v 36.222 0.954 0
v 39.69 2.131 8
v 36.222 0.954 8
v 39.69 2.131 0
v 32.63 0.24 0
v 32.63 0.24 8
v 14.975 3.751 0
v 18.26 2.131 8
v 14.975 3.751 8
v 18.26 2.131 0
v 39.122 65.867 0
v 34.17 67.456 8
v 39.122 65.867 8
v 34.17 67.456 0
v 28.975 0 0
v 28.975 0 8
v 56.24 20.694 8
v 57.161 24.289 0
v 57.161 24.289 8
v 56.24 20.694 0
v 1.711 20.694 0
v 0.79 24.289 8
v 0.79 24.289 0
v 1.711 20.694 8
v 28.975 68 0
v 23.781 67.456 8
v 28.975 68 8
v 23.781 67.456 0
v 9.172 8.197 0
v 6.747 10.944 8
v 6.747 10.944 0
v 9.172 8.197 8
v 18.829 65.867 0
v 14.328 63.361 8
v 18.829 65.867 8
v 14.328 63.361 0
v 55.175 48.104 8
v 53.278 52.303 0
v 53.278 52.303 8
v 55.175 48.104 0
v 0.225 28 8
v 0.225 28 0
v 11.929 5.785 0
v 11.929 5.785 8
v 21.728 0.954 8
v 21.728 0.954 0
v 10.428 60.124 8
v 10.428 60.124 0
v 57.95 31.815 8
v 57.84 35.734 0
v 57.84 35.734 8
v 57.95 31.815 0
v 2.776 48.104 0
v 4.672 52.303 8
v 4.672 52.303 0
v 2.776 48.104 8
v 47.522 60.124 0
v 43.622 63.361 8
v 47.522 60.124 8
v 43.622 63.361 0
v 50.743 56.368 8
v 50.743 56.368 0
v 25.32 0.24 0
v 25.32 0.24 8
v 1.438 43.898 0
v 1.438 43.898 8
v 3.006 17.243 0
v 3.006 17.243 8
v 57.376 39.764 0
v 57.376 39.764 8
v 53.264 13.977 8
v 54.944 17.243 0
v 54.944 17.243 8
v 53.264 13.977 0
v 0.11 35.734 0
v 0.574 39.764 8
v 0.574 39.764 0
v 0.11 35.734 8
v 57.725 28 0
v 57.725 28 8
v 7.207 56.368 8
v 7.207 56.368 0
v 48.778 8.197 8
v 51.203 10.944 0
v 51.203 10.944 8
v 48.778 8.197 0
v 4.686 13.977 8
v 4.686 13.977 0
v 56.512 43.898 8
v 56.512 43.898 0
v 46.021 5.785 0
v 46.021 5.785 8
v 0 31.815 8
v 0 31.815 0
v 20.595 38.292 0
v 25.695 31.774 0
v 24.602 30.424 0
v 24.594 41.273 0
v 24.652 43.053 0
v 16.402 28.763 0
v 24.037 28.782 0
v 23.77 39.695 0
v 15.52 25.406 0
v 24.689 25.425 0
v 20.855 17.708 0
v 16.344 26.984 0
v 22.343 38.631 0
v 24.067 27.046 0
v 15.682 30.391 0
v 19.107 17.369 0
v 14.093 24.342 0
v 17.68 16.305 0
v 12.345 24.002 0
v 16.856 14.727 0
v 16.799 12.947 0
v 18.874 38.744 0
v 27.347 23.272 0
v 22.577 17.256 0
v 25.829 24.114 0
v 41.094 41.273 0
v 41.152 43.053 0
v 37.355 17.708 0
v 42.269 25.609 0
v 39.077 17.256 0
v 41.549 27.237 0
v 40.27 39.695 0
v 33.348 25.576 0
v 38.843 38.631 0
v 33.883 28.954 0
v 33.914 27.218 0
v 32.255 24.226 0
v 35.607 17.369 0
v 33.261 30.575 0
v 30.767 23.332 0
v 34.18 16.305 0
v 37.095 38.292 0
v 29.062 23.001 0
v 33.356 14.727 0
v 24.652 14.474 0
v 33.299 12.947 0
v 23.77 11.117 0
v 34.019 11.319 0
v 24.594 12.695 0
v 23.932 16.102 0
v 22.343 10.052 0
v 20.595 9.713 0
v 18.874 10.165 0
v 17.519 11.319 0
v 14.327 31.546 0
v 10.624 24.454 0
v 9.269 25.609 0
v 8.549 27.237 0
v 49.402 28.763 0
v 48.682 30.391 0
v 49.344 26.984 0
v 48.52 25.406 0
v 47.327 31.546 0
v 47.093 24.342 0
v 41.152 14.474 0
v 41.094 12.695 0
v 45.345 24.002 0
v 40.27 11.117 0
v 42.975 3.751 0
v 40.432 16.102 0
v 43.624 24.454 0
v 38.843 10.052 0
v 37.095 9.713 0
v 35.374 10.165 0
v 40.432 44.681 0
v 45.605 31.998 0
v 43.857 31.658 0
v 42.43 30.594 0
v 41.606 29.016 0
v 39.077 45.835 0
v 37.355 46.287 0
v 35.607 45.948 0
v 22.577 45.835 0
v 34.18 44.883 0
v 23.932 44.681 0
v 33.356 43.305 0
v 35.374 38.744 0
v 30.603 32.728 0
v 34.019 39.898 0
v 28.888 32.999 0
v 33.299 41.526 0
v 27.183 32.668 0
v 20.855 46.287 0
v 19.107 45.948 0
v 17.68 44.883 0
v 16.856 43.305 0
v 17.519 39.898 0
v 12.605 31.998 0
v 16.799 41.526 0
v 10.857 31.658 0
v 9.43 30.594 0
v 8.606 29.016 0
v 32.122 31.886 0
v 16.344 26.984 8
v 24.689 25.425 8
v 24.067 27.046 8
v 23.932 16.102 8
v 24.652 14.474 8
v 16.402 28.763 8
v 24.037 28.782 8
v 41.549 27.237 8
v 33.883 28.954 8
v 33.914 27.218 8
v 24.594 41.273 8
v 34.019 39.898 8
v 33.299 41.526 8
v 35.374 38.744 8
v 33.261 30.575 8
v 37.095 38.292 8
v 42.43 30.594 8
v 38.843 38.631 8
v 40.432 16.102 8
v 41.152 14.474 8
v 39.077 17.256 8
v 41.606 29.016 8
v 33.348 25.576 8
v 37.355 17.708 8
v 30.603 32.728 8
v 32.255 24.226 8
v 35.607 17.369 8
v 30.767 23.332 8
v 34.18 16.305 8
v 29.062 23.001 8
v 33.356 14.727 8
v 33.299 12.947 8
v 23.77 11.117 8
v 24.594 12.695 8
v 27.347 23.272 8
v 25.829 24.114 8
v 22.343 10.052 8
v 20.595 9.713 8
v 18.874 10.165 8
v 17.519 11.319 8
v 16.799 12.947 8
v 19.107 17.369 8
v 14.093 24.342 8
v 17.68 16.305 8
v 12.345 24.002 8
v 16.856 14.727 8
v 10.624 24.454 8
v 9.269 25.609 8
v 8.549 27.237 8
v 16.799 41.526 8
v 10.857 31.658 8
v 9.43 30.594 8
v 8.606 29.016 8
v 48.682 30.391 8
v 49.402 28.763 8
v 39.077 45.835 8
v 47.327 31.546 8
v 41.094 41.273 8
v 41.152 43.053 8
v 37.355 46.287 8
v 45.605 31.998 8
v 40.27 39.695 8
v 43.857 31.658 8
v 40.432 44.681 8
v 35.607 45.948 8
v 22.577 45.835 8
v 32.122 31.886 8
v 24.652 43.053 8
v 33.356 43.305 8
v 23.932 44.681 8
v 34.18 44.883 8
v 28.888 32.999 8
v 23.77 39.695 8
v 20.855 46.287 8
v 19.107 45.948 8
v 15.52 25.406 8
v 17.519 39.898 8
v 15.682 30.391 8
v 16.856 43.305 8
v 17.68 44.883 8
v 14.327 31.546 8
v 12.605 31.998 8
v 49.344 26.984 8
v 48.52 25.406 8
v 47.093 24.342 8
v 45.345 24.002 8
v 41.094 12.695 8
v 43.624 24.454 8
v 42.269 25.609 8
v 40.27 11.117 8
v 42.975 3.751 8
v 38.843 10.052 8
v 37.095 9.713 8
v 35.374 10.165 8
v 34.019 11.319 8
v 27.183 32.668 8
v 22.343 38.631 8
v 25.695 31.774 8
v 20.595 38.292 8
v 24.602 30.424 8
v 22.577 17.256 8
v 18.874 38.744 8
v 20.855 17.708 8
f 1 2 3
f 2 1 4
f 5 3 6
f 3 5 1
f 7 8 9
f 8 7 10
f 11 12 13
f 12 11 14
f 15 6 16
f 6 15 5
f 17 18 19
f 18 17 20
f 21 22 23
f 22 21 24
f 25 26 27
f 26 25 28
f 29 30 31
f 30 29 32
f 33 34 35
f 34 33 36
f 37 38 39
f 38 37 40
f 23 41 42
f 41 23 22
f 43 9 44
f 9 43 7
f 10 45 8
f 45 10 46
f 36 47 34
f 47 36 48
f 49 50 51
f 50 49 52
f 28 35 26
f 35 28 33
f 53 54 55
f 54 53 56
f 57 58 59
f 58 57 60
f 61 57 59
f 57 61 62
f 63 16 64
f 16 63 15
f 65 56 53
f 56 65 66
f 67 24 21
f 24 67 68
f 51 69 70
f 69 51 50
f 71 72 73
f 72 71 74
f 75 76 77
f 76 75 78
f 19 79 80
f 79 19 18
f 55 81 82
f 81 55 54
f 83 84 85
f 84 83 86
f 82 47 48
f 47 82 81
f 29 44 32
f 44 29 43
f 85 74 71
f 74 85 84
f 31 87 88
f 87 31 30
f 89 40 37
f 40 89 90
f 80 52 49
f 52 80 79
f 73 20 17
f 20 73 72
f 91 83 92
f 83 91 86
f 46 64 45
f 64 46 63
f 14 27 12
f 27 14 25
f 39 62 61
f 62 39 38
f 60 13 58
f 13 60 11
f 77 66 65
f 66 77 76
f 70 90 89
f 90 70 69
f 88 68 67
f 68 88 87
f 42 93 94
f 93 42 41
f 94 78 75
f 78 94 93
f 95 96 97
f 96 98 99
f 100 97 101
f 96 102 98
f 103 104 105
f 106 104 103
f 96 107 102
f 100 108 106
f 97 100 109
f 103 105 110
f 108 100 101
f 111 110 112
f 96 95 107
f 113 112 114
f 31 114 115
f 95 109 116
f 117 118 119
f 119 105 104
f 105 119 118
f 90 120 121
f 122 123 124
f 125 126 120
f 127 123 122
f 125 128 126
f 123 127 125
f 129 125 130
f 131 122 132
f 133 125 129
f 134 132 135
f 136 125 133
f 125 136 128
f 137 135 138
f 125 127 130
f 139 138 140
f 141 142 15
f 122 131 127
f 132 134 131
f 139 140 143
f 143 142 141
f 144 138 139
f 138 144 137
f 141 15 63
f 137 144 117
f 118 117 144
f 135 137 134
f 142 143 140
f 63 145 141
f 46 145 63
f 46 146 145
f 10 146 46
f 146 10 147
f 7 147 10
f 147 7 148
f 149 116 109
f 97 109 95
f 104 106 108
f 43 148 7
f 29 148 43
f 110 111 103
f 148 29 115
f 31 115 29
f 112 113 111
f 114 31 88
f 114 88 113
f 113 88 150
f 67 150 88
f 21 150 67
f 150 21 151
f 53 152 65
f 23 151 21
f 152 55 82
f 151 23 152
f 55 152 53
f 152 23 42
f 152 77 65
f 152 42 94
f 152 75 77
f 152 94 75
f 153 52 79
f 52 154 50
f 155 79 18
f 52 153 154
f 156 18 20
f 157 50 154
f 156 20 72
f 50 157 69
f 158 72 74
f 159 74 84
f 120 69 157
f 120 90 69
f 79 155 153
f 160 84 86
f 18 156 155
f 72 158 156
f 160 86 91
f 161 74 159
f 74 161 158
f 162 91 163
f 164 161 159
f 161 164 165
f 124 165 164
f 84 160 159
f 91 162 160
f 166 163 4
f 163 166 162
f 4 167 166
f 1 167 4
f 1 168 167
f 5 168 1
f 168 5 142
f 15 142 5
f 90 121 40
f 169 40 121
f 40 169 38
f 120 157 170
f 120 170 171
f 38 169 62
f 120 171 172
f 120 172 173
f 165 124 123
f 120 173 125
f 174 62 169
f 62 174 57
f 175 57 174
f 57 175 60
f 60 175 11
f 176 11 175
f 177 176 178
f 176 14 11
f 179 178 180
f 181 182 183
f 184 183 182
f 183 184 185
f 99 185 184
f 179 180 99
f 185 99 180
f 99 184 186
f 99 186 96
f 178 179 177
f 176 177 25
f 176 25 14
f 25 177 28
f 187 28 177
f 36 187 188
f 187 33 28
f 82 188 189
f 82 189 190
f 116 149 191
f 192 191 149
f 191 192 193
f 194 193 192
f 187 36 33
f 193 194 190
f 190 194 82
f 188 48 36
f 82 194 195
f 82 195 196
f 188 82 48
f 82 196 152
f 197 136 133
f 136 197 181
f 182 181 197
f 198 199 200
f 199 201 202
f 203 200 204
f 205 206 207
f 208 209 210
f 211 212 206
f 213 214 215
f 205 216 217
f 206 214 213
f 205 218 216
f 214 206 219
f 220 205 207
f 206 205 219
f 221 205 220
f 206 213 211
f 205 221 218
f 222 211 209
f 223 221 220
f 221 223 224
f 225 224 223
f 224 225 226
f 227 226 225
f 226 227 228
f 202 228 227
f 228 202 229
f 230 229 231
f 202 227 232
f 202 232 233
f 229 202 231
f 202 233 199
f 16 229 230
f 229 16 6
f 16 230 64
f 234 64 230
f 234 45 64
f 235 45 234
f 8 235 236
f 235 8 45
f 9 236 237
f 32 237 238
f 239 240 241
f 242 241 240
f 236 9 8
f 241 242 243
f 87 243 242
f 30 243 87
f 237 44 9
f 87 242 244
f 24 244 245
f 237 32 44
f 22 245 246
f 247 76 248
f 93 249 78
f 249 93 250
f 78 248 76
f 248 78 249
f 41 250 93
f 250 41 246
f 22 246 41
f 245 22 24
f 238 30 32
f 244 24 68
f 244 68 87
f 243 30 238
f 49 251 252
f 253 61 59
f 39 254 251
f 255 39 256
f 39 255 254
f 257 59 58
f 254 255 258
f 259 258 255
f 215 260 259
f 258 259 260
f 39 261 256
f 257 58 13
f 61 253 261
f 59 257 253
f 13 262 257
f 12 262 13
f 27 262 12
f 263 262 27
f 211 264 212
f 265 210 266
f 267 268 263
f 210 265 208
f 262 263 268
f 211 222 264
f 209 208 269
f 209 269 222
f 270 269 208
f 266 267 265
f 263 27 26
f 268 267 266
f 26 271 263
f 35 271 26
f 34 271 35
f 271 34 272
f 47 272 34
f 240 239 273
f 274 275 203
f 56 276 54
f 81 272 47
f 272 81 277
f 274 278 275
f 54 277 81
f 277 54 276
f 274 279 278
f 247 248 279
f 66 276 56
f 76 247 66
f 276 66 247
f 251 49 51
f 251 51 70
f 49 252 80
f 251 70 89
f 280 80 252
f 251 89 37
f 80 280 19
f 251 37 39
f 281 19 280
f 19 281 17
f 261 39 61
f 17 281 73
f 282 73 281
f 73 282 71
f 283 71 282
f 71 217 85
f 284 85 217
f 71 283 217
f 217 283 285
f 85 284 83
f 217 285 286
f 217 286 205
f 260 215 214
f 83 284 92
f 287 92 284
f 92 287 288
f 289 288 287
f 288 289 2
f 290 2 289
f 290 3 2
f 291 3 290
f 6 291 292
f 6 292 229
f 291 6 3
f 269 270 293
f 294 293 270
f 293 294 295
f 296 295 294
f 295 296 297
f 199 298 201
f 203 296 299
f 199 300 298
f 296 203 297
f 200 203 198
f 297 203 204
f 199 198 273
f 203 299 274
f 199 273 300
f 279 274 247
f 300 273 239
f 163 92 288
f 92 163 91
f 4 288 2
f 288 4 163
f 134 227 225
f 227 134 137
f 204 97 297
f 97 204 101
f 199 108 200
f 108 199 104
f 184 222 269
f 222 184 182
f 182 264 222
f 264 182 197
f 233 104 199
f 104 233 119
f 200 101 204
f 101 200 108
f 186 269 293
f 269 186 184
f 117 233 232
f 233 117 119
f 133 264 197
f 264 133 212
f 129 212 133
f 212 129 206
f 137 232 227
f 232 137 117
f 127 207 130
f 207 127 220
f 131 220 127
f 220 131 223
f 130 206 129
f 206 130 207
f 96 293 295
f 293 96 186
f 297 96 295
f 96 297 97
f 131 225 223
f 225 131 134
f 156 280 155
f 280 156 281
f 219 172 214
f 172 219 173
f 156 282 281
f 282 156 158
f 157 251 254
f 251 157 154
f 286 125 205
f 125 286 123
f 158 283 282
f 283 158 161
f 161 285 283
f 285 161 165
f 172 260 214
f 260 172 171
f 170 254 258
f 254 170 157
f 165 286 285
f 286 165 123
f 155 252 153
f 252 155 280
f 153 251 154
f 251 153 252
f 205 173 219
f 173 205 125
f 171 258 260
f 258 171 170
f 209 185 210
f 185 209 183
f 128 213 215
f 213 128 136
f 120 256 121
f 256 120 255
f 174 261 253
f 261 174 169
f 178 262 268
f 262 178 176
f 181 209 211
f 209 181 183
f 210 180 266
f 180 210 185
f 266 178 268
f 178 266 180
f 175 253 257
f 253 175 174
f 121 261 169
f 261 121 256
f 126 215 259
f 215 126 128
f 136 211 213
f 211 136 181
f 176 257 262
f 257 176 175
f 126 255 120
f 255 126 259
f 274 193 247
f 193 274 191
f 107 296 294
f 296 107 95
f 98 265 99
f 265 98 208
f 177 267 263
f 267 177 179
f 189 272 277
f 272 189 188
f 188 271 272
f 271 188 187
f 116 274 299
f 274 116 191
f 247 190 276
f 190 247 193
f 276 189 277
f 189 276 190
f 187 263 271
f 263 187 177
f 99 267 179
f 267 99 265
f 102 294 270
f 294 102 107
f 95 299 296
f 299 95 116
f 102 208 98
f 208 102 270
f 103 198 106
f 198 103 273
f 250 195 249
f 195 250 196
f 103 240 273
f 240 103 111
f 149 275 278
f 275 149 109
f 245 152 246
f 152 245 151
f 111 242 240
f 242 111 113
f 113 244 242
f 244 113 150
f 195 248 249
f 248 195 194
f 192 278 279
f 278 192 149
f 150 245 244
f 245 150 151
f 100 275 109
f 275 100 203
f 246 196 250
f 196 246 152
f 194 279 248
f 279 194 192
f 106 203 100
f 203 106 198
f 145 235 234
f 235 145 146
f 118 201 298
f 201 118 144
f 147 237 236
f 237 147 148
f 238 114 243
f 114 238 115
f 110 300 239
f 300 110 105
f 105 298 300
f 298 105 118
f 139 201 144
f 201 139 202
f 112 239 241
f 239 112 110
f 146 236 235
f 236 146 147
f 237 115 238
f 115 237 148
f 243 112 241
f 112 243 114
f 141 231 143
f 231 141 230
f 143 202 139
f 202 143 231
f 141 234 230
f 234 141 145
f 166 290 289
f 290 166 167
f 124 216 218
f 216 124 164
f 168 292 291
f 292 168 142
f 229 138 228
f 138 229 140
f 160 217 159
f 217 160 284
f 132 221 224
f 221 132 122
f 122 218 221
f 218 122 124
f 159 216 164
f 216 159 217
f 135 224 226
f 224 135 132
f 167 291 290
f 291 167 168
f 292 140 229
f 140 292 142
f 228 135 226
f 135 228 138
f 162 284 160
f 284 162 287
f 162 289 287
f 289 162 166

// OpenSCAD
$fn = 32;

// ----------------------------------------------------------------------
// Cam plate: single_lobe cam, base R28
// ----------------------------------------------------------------------

// --- parameters (mm) ---
base_r = 28;              // base circle radius
lobe_h = 12;              // cam lobe rise
bore_r = 5;               // shaft bore radius
plate_t = 8;              // plate thickness, Z (extrusion height)
ring_r = 16.5;            // lightening ring radius
bolt_r = 4;               // lightening hole radius

profile = [[57.725, 28], [57.95, 31.815], [57.84, 35.734], [57.376, 39.764], [56.512, 43.898], [55.175, 48.104], [53.278, 52.303], [50.743, 56.368], [47.522, 60.124], [43.622, 63.361], [39.122, 65.867], [34.17, 67.456], [28.975, 68], [23.781, 67.456], [18.829, 65.867], [14.328, 63.361], [10.428, 60.124], [7.207, 56.368], [4.672, 52.303], [2.776, 48.104], [1.438, 43.898], [0.574, 39.764], [0.11, 35.734], [0, 31.815], [0.225, 28], [0.79, 24.289], [1.711, 20.694], [3.006, 17.243], [4.686, 13.977], [6.747, 10.944], [9.172, 8.197], [11.929, 5.785], [14.975, 3.751], [18.26, 2.131], [21.728, 0.954], [25.32, 0.24], [28.975, 0], [32.63, 0.24], [36.222, 0.954], [39.69, 2.131], [42.975, 3.751], [46.021, 5.785], [48.778, 8.197], [51.203, 10.944], [53.264, 13.977], [54.944, 17.243], [56.24, 20.694], [57.161, 24.289]];  // primary outline, 48 points, counter clockwise
void_1 = [[33.883, 28.954], [33.261, 30.575], [32.122, 31.886], [30.603, 32.728], [28.888, 32.999], [27.183, 32.668], [25.695, 31.774], [24.602, 30.424], [24.037, 28.782], [24.067, 27.046], [24.689, 25.425], [25.829, 24.114], [27.347, 23.272], [29.062, 23.001], [30.767, 23.332], [32.255, 24.226], [33.348, 25.576], [33.914, 27.218]];  // shaft bore, 18 points
void_2 = [[49.402, 28.763], [48.682, 30.391], [47.327, 31.546], [45.605, 31.998], [43.857, 31.658], [42.43, 30.594], [41.606, 29.016], [41.549, 27.237], [42.269, 25.609], [43.624, 24.454], [45.345, 24.002], [47.093, 24.342], [48.52, 25.406], [49.344, 26.984]];  // lightening hole 1, 14 points
void_3 = [[41.152, 43.053], [40.432, 44.681], [39.077, 45.835], [37.355, 46.287], [35.607, 45.948], [34.18, 44.883], [33.356, 43.305], [33.299, 41.526], [34.019, 39.898], [35.374, 38.744], [37.095, 38.292], [38.843, 38.631], [40.27, 39.695], [41.094, 41.273]];  // lightening hole 2, 14 points
void_4 = [[24.652, 43.053], [23.932, 44.681], [22.577, 45.835], [20.855, 46.287], [19.107, 45.948], [17.68, 44.883], [16.856, 43.305], [16.799, 41.526], [17.519, 39.898], [18.874, 38.744], [20.595, 38.292], [22.343, 38.631], [23.77, 39.695], [24.594, 41.273]];  // lightening hole 3, 14 points
void_5 = [[16.402, 28.763], [15.682, 30.391], [14.327, 31.546], [12.605, 31.998], [10.857, 31.658], [9.43, 30.594], [8.606, 29.016], [8.549, 27.237], [9.269, 25.609], [10.624, 24.454], [12.345, 24.002], [14.093, 24.342], [15.52, 25.406], [16.344, 26.984]];  // lightening hole 4, 14 points
void_6 = [[24.652, 14.474], [23.932, 16.102], [22.577, 17.256], [20.855, 17.708], [19.107, 17.369], [17.68, 16.305], [16.856, 14.727], [16.799, 12.947], [17.519, 11.319], [18.874, 10.165], [20.595, 9.713], [22.343, 10.052], [23.77, 11.117], [24.594, 12.695]];  // lightening hole 5, 14 points
void_7 = [[41.152, 14.474], [40.432, 16.102], [39.077, 17.256], [37.355, 17.708], [35.607, 17.369], [34.18, 16.305], [33.356, 14.727], [33.299, 12.947], [34.019, 11.319], [35.374, 10.165], [37.095, 9.713], [38.843, 10.052], [40.27, 11.117], [41.094, 12.695]];  // lightening hole 6, 14 points

// --- the one profile operation ---
difference() {
  linear_extrude(height = plate_t) polygon(points = profile);
  translate([0, 0, -1])
    linear_extrude(height = plate_t + 2) polygon(points = void_1);
  translate([0, 0, -1])
    linear_extrude(height = plate_t + 2) polygon(points = void_2);
  translate([0, 0, -1])
    linear_extrude(height = plate_t + 2) polygon(points = void_3);
  translate([0, 0, -1])
    linear_extrude(height = plate_t + 2) polygon(points = void_4);
  translate([0, 0, -1])
    linear_extrude(height = plate_t + 2) polygon(points = void_5);
  translate([0, 0, -1])
    linear_extrude(height = plate_t + 2) polygon(points = void_6);
  translate([0, 0, -1])
    linear_extrude(height = plate_t + 2) polygon(points = void_7);
}
